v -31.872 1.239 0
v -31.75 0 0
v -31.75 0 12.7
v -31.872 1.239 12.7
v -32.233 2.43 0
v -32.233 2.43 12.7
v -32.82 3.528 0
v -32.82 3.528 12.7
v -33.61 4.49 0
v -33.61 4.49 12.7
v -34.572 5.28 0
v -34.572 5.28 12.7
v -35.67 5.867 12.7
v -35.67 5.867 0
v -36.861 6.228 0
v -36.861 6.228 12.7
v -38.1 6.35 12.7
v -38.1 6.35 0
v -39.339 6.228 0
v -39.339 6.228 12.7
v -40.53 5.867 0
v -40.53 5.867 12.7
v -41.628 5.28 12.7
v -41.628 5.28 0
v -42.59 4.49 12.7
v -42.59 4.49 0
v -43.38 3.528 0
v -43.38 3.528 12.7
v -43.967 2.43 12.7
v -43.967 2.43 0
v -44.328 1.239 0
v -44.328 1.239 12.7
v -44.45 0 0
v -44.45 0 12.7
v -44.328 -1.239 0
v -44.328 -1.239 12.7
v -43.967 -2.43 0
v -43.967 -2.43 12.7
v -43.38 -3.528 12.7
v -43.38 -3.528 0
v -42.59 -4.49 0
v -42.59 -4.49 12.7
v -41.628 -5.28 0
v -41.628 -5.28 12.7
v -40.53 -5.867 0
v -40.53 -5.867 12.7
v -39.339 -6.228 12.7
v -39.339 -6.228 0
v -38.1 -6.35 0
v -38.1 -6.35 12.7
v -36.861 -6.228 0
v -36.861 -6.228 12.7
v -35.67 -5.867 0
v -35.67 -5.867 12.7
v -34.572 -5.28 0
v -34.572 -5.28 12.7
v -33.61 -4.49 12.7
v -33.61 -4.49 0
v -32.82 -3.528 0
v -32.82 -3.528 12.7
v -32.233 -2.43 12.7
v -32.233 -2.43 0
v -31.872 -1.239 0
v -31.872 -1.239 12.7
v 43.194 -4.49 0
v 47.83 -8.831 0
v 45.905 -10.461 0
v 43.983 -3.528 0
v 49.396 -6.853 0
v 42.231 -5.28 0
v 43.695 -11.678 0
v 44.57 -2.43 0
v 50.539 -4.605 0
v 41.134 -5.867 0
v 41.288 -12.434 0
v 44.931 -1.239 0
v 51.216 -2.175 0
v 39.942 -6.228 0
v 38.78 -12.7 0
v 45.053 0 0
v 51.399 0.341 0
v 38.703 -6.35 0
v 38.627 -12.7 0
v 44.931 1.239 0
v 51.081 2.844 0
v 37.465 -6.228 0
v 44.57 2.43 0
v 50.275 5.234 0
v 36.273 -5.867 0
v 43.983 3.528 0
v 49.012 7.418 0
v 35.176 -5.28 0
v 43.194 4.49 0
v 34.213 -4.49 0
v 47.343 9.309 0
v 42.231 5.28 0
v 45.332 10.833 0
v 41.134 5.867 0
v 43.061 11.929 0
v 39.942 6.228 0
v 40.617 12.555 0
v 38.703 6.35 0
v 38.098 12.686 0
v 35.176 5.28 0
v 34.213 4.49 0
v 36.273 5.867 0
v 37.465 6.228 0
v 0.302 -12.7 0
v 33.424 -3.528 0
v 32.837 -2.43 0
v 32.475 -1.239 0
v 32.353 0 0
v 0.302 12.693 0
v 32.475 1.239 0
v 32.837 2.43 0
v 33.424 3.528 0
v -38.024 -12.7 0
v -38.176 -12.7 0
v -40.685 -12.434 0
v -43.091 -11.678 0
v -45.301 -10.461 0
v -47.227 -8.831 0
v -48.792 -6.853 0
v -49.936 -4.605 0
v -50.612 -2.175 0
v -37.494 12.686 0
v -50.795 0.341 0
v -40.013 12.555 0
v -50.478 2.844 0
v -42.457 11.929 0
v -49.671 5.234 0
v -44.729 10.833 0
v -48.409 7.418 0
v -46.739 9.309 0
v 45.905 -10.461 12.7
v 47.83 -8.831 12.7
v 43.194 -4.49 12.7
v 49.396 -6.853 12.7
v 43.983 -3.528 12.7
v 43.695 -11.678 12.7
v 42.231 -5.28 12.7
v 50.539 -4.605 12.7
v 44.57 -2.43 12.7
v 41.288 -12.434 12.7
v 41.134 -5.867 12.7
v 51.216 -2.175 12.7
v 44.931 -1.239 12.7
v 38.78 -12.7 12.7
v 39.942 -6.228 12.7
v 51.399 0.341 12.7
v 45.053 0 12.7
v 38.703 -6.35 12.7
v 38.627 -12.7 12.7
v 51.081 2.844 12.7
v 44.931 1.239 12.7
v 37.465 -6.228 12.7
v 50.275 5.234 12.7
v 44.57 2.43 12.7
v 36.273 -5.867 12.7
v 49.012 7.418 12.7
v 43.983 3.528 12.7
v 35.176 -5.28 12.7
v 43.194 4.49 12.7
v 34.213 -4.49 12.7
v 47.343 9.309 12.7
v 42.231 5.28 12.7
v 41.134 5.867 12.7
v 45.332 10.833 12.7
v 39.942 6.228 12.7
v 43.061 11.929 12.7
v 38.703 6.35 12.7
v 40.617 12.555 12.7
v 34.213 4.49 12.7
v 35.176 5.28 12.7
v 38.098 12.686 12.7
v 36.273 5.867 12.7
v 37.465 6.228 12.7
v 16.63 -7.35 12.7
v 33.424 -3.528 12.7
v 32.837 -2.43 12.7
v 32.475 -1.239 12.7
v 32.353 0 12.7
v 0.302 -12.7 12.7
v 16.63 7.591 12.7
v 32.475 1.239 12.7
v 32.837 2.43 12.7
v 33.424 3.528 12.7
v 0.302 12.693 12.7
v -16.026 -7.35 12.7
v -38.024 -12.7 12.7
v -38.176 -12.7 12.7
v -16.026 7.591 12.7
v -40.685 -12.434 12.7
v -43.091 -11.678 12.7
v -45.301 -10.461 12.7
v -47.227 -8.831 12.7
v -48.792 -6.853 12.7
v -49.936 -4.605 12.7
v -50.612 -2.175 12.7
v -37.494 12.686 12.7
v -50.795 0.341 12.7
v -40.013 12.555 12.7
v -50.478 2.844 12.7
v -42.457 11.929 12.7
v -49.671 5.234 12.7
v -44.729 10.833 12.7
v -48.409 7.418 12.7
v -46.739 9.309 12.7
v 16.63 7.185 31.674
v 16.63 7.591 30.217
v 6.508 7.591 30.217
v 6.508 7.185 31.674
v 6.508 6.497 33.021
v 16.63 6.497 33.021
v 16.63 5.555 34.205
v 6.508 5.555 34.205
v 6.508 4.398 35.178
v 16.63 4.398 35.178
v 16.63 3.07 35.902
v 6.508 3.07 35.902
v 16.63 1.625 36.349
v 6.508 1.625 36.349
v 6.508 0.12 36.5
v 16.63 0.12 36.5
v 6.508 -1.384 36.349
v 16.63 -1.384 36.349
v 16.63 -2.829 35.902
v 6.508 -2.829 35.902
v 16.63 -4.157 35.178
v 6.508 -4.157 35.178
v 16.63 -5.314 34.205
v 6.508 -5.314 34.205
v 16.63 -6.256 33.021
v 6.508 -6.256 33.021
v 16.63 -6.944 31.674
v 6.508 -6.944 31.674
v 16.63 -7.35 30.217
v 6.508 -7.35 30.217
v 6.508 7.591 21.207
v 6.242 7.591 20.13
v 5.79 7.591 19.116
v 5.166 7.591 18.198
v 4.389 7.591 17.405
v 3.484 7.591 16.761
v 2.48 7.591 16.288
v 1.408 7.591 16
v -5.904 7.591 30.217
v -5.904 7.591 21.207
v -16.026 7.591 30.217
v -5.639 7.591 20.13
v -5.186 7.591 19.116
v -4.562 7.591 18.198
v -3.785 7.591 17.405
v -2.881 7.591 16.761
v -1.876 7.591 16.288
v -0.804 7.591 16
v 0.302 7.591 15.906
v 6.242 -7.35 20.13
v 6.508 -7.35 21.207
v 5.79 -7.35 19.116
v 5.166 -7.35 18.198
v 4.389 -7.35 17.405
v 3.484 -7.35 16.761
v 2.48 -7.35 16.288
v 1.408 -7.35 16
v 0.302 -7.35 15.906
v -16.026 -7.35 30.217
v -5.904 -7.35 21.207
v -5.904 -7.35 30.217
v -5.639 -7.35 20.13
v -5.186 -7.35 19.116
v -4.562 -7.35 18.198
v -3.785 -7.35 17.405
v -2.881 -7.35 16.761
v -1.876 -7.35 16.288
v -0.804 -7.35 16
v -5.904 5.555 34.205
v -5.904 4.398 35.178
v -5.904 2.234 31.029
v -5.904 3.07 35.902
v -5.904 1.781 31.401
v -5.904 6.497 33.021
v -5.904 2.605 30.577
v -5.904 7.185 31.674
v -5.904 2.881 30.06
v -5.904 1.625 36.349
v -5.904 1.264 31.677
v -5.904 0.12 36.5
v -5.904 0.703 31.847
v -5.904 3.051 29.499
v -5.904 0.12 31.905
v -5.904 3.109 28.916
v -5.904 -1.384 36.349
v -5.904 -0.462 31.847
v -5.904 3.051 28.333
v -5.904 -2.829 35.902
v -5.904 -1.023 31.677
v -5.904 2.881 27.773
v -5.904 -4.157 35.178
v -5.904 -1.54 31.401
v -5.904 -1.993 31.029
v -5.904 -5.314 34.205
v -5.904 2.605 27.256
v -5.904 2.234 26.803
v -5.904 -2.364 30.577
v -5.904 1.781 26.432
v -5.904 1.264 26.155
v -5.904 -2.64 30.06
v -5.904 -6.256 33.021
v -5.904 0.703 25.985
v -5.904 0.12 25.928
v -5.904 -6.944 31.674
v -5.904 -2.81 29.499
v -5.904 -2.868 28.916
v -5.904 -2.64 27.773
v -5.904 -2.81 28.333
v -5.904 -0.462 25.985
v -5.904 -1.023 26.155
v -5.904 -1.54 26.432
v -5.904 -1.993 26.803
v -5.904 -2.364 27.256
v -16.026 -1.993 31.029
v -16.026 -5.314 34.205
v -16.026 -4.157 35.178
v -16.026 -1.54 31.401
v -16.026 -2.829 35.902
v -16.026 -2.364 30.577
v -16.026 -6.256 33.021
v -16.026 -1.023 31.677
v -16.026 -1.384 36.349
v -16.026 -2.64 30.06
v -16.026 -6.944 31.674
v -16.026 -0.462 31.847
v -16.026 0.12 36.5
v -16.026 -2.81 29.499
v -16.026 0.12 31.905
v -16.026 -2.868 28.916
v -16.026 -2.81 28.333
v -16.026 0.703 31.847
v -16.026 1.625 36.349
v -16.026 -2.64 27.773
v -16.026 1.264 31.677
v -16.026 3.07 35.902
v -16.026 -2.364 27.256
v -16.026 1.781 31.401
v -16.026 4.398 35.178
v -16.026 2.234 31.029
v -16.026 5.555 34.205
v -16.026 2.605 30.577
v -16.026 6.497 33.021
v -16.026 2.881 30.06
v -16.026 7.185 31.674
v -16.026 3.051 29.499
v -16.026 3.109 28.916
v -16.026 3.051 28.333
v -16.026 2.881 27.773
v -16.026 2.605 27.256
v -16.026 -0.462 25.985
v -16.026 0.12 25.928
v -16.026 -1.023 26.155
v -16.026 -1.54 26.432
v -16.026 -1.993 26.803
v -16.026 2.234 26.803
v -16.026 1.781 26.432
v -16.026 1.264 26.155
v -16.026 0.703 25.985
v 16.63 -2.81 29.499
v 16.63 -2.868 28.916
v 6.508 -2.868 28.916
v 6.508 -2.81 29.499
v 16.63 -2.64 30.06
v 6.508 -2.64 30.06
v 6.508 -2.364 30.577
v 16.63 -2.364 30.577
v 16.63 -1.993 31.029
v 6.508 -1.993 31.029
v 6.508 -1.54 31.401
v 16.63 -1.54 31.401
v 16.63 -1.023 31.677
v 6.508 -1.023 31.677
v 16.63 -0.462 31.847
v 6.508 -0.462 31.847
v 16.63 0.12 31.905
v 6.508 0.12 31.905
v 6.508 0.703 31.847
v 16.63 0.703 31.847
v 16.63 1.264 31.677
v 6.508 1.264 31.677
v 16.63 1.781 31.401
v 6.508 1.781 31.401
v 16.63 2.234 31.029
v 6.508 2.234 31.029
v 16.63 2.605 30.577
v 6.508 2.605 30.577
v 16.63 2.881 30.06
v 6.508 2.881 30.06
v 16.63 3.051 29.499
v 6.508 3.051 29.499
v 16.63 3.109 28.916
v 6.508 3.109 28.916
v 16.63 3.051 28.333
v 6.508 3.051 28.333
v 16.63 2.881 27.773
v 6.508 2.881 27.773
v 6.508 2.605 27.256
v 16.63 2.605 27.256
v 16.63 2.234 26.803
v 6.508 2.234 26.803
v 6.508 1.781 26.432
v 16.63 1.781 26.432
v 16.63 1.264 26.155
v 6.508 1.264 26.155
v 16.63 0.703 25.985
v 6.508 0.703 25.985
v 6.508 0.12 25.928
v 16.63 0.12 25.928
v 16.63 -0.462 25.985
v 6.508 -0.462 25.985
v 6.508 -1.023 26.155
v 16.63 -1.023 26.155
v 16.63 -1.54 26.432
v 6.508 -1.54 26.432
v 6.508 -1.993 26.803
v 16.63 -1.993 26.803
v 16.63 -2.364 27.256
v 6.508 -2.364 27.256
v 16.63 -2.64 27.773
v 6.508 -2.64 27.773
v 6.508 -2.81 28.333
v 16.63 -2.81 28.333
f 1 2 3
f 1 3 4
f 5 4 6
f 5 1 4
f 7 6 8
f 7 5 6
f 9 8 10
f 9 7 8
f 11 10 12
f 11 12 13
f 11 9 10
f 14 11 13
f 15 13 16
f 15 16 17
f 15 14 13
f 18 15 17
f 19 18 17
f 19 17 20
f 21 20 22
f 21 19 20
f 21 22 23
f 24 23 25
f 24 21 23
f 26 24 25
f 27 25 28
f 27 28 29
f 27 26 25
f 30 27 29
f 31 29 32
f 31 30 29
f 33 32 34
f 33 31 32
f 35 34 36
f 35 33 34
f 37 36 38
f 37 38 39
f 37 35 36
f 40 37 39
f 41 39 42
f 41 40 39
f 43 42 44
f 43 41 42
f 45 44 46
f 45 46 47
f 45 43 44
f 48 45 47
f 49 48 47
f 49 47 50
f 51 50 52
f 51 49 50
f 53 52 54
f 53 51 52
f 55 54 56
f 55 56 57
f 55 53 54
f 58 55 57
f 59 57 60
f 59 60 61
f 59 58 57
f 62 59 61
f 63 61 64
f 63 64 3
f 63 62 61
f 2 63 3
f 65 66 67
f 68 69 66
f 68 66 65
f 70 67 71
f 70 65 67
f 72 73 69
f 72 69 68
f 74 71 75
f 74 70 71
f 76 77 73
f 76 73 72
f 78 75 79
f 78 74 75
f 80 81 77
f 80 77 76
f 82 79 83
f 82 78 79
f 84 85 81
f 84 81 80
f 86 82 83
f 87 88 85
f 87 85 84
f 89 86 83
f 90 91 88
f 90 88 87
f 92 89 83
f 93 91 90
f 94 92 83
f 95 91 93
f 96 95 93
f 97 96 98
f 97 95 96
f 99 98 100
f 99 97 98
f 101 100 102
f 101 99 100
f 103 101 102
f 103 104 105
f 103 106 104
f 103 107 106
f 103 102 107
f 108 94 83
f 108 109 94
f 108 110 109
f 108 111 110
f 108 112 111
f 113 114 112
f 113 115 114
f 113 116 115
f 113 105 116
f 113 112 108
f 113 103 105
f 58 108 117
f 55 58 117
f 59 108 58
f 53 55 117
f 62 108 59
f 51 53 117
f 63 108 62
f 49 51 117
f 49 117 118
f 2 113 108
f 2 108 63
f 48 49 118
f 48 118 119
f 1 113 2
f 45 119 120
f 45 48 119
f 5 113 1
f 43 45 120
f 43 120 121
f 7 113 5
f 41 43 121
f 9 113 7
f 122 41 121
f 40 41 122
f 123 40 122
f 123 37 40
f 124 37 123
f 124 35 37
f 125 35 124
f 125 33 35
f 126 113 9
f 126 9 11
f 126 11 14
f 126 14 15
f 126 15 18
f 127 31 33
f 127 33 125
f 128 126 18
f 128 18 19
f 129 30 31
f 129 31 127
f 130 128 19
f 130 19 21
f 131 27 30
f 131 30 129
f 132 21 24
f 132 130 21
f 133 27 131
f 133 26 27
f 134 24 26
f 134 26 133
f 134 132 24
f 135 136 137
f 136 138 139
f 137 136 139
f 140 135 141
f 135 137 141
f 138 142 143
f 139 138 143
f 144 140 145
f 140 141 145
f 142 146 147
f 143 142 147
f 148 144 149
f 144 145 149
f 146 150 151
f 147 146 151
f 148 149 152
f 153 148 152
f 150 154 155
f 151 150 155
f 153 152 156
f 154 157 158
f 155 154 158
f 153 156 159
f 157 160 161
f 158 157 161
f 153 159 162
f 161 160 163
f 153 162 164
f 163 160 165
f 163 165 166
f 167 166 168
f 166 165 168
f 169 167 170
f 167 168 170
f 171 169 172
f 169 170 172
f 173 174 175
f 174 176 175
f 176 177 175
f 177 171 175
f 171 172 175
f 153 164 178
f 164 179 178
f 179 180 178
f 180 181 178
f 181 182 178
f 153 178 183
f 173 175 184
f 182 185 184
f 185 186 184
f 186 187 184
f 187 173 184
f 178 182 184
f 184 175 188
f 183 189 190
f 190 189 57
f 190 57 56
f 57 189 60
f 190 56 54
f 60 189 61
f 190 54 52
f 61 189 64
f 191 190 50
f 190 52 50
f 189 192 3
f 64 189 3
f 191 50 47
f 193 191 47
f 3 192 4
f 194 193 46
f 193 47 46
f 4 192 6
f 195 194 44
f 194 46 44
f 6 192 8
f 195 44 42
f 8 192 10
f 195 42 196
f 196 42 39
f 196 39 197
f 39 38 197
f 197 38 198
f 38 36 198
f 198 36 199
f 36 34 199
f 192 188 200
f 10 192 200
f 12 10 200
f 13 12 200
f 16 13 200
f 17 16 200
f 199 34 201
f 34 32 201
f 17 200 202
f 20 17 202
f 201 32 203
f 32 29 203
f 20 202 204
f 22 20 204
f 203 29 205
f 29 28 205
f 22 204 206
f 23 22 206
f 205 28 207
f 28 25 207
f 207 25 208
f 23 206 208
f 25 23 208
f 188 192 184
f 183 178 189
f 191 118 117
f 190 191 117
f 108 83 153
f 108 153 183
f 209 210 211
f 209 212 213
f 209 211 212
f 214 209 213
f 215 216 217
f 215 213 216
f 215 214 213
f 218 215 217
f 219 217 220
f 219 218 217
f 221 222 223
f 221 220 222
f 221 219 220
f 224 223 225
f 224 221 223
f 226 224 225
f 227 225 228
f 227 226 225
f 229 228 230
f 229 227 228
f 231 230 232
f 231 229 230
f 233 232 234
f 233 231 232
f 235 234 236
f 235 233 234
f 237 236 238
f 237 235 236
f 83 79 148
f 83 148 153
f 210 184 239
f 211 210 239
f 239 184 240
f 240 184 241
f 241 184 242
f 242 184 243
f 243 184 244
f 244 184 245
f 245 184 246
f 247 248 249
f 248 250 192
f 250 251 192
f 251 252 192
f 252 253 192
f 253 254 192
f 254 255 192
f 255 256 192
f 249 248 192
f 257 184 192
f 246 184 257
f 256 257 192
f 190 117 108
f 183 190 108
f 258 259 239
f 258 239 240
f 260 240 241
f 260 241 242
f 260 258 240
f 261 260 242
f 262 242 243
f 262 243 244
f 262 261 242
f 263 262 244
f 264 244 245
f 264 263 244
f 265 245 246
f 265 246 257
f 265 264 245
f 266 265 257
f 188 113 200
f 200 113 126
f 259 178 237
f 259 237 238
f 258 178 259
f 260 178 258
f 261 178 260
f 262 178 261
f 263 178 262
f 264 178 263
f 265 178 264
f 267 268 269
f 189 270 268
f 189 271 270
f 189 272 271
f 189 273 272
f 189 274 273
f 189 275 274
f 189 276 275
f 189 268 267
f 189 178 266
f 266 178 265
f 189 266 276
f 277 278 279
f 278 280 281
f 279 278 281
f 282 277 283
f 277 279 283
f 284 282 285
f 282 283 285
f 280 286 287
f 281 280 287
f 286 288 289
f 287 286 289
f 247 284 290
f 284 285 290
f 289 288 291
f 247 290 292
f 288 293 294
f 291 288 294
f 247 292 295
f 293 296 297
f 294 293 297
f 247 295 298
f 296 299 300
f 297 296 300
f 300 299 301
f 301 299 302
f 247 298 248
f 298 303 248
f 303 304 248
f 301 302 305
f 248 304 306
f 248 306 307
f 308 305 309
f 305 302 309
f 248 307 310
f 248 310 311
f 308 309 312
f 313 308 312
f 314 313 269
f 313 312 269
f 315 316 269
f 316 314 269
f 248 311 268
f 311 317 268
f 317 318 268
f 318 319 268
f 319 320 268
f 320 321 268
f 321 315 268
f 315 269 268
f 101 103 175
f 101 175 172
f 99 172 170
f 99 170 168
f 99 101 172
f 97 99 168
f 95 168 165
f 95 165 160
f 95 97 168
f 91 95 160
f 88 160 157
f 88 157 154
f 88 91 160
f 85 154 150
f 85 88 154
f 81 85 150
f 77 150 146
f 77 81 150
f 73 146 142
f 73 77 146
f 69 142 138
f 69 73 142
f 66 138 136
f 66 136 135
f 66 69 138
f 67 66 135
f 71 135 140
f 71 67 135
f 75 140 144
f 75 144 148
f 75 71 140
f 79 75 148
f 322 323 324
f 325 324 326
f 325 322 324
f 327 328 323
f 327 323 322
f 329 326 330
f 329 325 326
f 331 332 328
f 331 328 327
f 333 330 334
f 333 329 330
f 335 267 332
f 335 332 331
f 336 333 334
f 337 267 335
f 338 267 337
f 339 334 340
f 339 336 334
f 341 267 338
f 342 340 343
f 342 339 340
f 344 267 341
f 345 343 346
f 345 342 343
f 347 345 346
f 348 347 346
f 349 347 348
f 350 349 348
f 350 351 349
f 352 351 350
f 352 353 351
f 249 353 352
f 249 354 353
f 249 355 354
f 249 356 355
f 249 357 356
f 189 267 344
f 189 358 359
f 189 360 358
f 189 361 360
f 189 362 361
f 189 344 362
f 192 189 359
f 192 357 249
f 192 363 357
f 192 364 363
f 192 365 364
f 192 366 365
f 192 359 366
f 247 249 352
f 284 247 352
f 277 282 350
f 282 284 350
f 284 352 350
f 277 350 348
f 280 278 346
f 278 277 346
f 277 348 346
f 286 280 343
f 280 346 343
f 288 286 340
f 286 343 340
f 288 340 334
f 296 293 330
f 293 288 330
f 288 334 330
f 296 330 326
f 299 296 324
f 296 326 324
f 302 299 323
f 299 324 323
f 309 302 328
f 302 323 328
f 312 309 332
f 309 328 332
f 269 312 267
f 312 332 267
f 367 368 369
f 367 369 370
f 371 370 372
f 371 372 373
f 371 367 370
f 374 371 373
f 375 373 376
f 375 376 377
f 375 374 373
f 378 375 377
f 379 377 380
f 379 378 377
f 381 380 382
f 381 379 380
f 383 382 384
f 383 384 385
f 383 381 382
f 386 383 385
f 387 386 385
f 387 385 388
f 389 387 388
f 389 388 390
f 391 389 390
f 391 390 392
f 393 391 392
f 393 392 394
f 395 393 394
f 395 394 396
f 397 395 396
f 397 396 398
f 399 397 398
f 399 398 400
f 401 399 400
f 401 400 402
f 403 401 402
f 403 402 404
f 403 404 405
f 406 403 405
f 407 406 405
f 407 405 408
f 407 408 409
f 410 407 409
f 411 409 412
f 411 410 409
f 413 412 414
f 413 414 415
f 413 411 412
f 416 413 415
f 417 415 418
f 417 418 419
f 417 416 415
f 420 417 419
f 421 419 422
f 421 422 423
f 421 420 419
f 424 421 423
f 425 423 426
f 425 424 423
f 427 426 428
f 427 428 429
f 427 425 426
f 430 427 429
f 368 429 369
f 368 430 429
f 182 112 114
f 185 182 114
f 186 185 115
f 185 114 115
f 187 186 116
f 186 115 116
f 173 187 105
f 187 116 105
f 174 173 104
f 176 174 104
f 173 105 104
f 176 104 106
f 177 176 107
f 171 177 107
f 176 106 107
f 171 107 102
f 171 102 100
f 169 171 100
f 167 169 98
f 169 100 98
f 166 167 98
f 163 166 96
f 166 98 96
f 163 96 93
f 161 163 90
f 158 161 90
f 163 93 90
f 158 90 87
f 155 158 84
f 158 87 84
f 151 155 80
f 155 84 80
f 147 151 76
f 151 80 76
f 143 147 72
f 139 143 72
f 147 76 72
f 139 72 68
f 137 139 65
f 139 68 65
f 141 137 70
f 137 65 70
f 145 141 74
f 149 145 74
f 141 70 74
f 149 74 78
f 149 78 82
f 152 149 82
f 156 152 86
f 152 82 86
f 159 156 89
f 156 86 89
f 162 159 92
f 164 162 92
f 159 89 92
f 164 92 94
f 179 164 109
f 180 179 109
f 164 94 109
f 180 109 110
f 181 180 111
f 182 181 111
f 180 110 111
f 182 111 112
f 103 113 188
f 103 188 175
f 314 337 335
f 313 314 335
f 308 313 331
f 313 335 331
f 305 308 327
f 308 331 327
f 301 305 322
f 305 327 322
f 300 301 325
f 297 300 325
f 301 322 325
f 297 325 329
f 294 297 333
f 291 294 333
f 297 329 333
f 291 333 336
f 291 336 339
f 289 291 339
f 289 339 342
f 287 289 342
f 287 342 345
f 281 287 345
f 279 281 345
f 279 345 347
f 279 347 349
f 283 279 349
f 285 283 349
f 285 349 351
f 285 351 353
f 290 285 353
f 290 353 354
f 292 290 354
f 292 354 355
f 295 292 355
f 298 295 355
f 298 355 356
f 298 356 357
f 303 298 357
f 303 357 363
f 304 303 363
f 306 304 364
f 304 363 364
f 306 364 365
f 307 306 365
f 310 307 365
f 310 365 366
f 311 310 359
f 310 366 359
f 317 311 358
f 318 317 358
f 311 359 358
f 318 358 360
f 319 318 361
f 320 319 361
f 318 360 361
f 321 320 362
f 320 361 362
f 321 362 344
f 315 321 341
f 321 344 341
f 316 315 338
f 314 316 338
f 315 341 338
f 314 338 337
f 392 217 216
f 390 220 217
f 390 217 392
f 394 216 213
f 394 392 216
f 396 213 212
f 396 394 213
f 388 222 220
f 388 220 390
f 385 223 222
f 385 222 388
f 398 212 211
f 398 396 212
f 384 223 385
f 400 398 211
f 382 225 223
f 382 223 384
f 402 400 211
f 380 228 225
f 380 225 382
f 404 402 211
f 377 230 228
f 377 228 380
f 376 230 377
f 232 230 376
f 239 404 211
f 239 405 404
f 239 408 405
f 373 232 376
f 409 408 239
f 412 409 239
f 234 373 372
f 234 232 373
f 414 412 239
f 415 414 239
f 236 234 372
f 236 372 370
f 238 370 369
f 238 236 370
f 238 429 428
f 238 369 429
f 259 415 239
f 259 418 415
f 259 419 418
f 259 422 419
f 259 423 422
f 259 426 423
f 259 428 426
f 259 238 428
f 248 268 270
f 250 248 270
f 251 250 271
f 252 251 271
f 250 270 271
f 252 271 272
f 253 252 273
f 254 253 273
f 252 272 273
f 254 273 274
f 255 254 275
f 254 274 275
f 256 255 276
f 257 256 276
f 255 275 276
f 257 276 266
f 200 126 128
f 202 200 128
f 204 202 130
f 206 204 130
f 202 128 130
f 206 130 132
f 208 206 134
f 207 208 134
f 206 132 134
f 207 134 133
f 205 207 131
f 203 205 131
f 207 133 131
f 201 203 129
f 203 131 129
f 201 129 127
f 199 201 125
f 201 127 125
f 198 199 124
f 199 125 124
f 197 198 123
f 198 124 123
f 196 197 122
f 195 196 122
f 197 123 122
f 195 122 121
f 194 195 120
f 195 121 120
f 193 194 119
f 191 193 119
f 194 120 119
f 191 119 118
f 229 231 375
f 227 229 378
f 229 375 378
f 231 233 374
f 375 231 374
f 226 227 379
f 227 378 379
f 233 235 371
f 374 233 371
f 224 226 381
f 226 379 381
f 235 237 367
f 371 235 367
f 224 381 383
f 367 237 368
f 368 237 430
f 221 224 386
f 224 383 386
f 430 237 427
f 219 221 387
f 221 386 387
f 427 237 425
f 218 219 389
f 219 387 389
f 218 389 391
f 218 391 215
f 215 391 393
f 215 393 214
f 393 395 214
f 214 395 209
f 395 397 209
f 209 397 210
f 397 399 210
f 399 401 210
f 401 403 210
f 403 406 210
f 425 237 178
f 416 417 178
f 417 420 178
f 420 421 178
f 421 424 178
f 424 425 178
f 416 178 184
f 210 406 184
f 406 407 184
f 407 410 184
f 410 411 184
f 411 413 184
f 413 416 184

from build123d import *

# Parameters (mm, degrees)
F0_R     = 6.35
F1_DEPTH = 12.7
F0_W     = 16.3278355569
F0_H     = 14.9416262284
F2_DEPTH = 38.1
F4_DEPTH = 25.4
F6_DEPTH = 25.4
F5_R     = 2.9883408706
F7_DEPTH = 25.4


with BuildPart() as f1:
    # F0 (on Top) → F1 (new body)
    with BuildSketch(Plane.XY):
        with BuildLine():
            Line((0.3017354131, 12.6927690867), (-37.4940995503, 12.6855384058))
            ThreePointArc((-37.4940995503, 12.6855384058), (-50.7954163284, 0.341180667), (-38.1763124432, -12.6997707228))
            Line((-38.1763124432, -12.6997707228), (-38.0237639047, -12.6997711813))
            Line((-38.0237639047, -12.6997711813), (0.3017354131, -12.6998863831))
            Line((0.3017354131, -12.6998863831), (0.3017354131, -7.3503162712))
            Line((0.3017354131, -7.3503162712), (-16.0261001438, -7.3503162712))
            Line((-16.0261001438, -7.3503162712), (-16.0261001438, 7.5913099572))
            Line((-16.0261001438, 7.5913099572), (0.3017354131, 7.5913099572))
            Line((0.3017354131, 7.5913099572), (0.3017354131, 12.6927690867))
        make_face()
        with Locations((-38.1, 0)):
            Circle(F0_R, mode=Mode.SUBTRACT)
    extrude(amount=F1_DEPTH)

    # F0 (on Top) → F2 (join)
    with BuildSketch(Plane.XY):
        with Locations((-7.8621823653, 0.120496843)):
            Rectangle(F0_W, F0_H)
    extrude(amount=F2_DEPTH)

    # F3 (on face) → F4 (cut)
    with BuildSketch(Plane.XZ.offset(7.3503162712)):
        with BuildLine():
            Line((-5.9043527581, 38.1), (-5.9043527581, 21.2074704468))
            ThreePointArc((-5.9043527581, 21.2074704468), (-3.7853007654, 17.4047273656), (0.3017354131, 15.9056037664))
            Line((0.3017354131, 15.9056037664), (0.3017354131, 38.1))
            Line((0.3017354131, 38.1), (-5.9043527581, 38.1))
        make_face()
    extrude(amount=-F4_DEPTH, mode=Mode.SUBTRACT)

    # F5 (on face) → F6 (cut)
    with BuildSketch(Plane(origin=(-16.0261001438, 0, 0), x_dir=(0, -1, 0), z_dir=(-1, 0, 0))):
        with BuildLine():
            ThreePointArc((-7.5913099572, 30.2173364908), (-0.120496843, 36.4995504426), (7.3503162712, 30.2173364908))
            Line((7.3503162712, 30.2173364908), (7.3503162712, 38.1))
            Line((7.3503162712, 38.1), (-7.5913099572, 38.1))
            Line((-7.5913099572, 38.1), (-7.5913099572, 30.2173364908))
        make_face()
    extrude(amount=-F6_DEPTH, mode=Mode.SUBTRACT)

    # F5 (on face) → F7 (cut)
    with BuildSketch(Plane(origin=(-16.0261001438, 0, 0), x_dir=(0, -1, 0), z_dir=(-1, 0, 0))):
        with Locations((-0.120496843, 28.9162954426)):
            Circle(F5_R)
    extrude(amount=-F7_DEPTH, mode=Mode.SUBTRACT)

    # F8: F1 across face


with BuildPart() as f1_1:
    add(f1.part)
    add(f1.part.mirror(Plane(origin=(0.3017354131, 0.0124838458, 7.3784331219), x_dir=(0, 1, 0), z_dir=(1, 0, 0))))


solid = f1_1.part
